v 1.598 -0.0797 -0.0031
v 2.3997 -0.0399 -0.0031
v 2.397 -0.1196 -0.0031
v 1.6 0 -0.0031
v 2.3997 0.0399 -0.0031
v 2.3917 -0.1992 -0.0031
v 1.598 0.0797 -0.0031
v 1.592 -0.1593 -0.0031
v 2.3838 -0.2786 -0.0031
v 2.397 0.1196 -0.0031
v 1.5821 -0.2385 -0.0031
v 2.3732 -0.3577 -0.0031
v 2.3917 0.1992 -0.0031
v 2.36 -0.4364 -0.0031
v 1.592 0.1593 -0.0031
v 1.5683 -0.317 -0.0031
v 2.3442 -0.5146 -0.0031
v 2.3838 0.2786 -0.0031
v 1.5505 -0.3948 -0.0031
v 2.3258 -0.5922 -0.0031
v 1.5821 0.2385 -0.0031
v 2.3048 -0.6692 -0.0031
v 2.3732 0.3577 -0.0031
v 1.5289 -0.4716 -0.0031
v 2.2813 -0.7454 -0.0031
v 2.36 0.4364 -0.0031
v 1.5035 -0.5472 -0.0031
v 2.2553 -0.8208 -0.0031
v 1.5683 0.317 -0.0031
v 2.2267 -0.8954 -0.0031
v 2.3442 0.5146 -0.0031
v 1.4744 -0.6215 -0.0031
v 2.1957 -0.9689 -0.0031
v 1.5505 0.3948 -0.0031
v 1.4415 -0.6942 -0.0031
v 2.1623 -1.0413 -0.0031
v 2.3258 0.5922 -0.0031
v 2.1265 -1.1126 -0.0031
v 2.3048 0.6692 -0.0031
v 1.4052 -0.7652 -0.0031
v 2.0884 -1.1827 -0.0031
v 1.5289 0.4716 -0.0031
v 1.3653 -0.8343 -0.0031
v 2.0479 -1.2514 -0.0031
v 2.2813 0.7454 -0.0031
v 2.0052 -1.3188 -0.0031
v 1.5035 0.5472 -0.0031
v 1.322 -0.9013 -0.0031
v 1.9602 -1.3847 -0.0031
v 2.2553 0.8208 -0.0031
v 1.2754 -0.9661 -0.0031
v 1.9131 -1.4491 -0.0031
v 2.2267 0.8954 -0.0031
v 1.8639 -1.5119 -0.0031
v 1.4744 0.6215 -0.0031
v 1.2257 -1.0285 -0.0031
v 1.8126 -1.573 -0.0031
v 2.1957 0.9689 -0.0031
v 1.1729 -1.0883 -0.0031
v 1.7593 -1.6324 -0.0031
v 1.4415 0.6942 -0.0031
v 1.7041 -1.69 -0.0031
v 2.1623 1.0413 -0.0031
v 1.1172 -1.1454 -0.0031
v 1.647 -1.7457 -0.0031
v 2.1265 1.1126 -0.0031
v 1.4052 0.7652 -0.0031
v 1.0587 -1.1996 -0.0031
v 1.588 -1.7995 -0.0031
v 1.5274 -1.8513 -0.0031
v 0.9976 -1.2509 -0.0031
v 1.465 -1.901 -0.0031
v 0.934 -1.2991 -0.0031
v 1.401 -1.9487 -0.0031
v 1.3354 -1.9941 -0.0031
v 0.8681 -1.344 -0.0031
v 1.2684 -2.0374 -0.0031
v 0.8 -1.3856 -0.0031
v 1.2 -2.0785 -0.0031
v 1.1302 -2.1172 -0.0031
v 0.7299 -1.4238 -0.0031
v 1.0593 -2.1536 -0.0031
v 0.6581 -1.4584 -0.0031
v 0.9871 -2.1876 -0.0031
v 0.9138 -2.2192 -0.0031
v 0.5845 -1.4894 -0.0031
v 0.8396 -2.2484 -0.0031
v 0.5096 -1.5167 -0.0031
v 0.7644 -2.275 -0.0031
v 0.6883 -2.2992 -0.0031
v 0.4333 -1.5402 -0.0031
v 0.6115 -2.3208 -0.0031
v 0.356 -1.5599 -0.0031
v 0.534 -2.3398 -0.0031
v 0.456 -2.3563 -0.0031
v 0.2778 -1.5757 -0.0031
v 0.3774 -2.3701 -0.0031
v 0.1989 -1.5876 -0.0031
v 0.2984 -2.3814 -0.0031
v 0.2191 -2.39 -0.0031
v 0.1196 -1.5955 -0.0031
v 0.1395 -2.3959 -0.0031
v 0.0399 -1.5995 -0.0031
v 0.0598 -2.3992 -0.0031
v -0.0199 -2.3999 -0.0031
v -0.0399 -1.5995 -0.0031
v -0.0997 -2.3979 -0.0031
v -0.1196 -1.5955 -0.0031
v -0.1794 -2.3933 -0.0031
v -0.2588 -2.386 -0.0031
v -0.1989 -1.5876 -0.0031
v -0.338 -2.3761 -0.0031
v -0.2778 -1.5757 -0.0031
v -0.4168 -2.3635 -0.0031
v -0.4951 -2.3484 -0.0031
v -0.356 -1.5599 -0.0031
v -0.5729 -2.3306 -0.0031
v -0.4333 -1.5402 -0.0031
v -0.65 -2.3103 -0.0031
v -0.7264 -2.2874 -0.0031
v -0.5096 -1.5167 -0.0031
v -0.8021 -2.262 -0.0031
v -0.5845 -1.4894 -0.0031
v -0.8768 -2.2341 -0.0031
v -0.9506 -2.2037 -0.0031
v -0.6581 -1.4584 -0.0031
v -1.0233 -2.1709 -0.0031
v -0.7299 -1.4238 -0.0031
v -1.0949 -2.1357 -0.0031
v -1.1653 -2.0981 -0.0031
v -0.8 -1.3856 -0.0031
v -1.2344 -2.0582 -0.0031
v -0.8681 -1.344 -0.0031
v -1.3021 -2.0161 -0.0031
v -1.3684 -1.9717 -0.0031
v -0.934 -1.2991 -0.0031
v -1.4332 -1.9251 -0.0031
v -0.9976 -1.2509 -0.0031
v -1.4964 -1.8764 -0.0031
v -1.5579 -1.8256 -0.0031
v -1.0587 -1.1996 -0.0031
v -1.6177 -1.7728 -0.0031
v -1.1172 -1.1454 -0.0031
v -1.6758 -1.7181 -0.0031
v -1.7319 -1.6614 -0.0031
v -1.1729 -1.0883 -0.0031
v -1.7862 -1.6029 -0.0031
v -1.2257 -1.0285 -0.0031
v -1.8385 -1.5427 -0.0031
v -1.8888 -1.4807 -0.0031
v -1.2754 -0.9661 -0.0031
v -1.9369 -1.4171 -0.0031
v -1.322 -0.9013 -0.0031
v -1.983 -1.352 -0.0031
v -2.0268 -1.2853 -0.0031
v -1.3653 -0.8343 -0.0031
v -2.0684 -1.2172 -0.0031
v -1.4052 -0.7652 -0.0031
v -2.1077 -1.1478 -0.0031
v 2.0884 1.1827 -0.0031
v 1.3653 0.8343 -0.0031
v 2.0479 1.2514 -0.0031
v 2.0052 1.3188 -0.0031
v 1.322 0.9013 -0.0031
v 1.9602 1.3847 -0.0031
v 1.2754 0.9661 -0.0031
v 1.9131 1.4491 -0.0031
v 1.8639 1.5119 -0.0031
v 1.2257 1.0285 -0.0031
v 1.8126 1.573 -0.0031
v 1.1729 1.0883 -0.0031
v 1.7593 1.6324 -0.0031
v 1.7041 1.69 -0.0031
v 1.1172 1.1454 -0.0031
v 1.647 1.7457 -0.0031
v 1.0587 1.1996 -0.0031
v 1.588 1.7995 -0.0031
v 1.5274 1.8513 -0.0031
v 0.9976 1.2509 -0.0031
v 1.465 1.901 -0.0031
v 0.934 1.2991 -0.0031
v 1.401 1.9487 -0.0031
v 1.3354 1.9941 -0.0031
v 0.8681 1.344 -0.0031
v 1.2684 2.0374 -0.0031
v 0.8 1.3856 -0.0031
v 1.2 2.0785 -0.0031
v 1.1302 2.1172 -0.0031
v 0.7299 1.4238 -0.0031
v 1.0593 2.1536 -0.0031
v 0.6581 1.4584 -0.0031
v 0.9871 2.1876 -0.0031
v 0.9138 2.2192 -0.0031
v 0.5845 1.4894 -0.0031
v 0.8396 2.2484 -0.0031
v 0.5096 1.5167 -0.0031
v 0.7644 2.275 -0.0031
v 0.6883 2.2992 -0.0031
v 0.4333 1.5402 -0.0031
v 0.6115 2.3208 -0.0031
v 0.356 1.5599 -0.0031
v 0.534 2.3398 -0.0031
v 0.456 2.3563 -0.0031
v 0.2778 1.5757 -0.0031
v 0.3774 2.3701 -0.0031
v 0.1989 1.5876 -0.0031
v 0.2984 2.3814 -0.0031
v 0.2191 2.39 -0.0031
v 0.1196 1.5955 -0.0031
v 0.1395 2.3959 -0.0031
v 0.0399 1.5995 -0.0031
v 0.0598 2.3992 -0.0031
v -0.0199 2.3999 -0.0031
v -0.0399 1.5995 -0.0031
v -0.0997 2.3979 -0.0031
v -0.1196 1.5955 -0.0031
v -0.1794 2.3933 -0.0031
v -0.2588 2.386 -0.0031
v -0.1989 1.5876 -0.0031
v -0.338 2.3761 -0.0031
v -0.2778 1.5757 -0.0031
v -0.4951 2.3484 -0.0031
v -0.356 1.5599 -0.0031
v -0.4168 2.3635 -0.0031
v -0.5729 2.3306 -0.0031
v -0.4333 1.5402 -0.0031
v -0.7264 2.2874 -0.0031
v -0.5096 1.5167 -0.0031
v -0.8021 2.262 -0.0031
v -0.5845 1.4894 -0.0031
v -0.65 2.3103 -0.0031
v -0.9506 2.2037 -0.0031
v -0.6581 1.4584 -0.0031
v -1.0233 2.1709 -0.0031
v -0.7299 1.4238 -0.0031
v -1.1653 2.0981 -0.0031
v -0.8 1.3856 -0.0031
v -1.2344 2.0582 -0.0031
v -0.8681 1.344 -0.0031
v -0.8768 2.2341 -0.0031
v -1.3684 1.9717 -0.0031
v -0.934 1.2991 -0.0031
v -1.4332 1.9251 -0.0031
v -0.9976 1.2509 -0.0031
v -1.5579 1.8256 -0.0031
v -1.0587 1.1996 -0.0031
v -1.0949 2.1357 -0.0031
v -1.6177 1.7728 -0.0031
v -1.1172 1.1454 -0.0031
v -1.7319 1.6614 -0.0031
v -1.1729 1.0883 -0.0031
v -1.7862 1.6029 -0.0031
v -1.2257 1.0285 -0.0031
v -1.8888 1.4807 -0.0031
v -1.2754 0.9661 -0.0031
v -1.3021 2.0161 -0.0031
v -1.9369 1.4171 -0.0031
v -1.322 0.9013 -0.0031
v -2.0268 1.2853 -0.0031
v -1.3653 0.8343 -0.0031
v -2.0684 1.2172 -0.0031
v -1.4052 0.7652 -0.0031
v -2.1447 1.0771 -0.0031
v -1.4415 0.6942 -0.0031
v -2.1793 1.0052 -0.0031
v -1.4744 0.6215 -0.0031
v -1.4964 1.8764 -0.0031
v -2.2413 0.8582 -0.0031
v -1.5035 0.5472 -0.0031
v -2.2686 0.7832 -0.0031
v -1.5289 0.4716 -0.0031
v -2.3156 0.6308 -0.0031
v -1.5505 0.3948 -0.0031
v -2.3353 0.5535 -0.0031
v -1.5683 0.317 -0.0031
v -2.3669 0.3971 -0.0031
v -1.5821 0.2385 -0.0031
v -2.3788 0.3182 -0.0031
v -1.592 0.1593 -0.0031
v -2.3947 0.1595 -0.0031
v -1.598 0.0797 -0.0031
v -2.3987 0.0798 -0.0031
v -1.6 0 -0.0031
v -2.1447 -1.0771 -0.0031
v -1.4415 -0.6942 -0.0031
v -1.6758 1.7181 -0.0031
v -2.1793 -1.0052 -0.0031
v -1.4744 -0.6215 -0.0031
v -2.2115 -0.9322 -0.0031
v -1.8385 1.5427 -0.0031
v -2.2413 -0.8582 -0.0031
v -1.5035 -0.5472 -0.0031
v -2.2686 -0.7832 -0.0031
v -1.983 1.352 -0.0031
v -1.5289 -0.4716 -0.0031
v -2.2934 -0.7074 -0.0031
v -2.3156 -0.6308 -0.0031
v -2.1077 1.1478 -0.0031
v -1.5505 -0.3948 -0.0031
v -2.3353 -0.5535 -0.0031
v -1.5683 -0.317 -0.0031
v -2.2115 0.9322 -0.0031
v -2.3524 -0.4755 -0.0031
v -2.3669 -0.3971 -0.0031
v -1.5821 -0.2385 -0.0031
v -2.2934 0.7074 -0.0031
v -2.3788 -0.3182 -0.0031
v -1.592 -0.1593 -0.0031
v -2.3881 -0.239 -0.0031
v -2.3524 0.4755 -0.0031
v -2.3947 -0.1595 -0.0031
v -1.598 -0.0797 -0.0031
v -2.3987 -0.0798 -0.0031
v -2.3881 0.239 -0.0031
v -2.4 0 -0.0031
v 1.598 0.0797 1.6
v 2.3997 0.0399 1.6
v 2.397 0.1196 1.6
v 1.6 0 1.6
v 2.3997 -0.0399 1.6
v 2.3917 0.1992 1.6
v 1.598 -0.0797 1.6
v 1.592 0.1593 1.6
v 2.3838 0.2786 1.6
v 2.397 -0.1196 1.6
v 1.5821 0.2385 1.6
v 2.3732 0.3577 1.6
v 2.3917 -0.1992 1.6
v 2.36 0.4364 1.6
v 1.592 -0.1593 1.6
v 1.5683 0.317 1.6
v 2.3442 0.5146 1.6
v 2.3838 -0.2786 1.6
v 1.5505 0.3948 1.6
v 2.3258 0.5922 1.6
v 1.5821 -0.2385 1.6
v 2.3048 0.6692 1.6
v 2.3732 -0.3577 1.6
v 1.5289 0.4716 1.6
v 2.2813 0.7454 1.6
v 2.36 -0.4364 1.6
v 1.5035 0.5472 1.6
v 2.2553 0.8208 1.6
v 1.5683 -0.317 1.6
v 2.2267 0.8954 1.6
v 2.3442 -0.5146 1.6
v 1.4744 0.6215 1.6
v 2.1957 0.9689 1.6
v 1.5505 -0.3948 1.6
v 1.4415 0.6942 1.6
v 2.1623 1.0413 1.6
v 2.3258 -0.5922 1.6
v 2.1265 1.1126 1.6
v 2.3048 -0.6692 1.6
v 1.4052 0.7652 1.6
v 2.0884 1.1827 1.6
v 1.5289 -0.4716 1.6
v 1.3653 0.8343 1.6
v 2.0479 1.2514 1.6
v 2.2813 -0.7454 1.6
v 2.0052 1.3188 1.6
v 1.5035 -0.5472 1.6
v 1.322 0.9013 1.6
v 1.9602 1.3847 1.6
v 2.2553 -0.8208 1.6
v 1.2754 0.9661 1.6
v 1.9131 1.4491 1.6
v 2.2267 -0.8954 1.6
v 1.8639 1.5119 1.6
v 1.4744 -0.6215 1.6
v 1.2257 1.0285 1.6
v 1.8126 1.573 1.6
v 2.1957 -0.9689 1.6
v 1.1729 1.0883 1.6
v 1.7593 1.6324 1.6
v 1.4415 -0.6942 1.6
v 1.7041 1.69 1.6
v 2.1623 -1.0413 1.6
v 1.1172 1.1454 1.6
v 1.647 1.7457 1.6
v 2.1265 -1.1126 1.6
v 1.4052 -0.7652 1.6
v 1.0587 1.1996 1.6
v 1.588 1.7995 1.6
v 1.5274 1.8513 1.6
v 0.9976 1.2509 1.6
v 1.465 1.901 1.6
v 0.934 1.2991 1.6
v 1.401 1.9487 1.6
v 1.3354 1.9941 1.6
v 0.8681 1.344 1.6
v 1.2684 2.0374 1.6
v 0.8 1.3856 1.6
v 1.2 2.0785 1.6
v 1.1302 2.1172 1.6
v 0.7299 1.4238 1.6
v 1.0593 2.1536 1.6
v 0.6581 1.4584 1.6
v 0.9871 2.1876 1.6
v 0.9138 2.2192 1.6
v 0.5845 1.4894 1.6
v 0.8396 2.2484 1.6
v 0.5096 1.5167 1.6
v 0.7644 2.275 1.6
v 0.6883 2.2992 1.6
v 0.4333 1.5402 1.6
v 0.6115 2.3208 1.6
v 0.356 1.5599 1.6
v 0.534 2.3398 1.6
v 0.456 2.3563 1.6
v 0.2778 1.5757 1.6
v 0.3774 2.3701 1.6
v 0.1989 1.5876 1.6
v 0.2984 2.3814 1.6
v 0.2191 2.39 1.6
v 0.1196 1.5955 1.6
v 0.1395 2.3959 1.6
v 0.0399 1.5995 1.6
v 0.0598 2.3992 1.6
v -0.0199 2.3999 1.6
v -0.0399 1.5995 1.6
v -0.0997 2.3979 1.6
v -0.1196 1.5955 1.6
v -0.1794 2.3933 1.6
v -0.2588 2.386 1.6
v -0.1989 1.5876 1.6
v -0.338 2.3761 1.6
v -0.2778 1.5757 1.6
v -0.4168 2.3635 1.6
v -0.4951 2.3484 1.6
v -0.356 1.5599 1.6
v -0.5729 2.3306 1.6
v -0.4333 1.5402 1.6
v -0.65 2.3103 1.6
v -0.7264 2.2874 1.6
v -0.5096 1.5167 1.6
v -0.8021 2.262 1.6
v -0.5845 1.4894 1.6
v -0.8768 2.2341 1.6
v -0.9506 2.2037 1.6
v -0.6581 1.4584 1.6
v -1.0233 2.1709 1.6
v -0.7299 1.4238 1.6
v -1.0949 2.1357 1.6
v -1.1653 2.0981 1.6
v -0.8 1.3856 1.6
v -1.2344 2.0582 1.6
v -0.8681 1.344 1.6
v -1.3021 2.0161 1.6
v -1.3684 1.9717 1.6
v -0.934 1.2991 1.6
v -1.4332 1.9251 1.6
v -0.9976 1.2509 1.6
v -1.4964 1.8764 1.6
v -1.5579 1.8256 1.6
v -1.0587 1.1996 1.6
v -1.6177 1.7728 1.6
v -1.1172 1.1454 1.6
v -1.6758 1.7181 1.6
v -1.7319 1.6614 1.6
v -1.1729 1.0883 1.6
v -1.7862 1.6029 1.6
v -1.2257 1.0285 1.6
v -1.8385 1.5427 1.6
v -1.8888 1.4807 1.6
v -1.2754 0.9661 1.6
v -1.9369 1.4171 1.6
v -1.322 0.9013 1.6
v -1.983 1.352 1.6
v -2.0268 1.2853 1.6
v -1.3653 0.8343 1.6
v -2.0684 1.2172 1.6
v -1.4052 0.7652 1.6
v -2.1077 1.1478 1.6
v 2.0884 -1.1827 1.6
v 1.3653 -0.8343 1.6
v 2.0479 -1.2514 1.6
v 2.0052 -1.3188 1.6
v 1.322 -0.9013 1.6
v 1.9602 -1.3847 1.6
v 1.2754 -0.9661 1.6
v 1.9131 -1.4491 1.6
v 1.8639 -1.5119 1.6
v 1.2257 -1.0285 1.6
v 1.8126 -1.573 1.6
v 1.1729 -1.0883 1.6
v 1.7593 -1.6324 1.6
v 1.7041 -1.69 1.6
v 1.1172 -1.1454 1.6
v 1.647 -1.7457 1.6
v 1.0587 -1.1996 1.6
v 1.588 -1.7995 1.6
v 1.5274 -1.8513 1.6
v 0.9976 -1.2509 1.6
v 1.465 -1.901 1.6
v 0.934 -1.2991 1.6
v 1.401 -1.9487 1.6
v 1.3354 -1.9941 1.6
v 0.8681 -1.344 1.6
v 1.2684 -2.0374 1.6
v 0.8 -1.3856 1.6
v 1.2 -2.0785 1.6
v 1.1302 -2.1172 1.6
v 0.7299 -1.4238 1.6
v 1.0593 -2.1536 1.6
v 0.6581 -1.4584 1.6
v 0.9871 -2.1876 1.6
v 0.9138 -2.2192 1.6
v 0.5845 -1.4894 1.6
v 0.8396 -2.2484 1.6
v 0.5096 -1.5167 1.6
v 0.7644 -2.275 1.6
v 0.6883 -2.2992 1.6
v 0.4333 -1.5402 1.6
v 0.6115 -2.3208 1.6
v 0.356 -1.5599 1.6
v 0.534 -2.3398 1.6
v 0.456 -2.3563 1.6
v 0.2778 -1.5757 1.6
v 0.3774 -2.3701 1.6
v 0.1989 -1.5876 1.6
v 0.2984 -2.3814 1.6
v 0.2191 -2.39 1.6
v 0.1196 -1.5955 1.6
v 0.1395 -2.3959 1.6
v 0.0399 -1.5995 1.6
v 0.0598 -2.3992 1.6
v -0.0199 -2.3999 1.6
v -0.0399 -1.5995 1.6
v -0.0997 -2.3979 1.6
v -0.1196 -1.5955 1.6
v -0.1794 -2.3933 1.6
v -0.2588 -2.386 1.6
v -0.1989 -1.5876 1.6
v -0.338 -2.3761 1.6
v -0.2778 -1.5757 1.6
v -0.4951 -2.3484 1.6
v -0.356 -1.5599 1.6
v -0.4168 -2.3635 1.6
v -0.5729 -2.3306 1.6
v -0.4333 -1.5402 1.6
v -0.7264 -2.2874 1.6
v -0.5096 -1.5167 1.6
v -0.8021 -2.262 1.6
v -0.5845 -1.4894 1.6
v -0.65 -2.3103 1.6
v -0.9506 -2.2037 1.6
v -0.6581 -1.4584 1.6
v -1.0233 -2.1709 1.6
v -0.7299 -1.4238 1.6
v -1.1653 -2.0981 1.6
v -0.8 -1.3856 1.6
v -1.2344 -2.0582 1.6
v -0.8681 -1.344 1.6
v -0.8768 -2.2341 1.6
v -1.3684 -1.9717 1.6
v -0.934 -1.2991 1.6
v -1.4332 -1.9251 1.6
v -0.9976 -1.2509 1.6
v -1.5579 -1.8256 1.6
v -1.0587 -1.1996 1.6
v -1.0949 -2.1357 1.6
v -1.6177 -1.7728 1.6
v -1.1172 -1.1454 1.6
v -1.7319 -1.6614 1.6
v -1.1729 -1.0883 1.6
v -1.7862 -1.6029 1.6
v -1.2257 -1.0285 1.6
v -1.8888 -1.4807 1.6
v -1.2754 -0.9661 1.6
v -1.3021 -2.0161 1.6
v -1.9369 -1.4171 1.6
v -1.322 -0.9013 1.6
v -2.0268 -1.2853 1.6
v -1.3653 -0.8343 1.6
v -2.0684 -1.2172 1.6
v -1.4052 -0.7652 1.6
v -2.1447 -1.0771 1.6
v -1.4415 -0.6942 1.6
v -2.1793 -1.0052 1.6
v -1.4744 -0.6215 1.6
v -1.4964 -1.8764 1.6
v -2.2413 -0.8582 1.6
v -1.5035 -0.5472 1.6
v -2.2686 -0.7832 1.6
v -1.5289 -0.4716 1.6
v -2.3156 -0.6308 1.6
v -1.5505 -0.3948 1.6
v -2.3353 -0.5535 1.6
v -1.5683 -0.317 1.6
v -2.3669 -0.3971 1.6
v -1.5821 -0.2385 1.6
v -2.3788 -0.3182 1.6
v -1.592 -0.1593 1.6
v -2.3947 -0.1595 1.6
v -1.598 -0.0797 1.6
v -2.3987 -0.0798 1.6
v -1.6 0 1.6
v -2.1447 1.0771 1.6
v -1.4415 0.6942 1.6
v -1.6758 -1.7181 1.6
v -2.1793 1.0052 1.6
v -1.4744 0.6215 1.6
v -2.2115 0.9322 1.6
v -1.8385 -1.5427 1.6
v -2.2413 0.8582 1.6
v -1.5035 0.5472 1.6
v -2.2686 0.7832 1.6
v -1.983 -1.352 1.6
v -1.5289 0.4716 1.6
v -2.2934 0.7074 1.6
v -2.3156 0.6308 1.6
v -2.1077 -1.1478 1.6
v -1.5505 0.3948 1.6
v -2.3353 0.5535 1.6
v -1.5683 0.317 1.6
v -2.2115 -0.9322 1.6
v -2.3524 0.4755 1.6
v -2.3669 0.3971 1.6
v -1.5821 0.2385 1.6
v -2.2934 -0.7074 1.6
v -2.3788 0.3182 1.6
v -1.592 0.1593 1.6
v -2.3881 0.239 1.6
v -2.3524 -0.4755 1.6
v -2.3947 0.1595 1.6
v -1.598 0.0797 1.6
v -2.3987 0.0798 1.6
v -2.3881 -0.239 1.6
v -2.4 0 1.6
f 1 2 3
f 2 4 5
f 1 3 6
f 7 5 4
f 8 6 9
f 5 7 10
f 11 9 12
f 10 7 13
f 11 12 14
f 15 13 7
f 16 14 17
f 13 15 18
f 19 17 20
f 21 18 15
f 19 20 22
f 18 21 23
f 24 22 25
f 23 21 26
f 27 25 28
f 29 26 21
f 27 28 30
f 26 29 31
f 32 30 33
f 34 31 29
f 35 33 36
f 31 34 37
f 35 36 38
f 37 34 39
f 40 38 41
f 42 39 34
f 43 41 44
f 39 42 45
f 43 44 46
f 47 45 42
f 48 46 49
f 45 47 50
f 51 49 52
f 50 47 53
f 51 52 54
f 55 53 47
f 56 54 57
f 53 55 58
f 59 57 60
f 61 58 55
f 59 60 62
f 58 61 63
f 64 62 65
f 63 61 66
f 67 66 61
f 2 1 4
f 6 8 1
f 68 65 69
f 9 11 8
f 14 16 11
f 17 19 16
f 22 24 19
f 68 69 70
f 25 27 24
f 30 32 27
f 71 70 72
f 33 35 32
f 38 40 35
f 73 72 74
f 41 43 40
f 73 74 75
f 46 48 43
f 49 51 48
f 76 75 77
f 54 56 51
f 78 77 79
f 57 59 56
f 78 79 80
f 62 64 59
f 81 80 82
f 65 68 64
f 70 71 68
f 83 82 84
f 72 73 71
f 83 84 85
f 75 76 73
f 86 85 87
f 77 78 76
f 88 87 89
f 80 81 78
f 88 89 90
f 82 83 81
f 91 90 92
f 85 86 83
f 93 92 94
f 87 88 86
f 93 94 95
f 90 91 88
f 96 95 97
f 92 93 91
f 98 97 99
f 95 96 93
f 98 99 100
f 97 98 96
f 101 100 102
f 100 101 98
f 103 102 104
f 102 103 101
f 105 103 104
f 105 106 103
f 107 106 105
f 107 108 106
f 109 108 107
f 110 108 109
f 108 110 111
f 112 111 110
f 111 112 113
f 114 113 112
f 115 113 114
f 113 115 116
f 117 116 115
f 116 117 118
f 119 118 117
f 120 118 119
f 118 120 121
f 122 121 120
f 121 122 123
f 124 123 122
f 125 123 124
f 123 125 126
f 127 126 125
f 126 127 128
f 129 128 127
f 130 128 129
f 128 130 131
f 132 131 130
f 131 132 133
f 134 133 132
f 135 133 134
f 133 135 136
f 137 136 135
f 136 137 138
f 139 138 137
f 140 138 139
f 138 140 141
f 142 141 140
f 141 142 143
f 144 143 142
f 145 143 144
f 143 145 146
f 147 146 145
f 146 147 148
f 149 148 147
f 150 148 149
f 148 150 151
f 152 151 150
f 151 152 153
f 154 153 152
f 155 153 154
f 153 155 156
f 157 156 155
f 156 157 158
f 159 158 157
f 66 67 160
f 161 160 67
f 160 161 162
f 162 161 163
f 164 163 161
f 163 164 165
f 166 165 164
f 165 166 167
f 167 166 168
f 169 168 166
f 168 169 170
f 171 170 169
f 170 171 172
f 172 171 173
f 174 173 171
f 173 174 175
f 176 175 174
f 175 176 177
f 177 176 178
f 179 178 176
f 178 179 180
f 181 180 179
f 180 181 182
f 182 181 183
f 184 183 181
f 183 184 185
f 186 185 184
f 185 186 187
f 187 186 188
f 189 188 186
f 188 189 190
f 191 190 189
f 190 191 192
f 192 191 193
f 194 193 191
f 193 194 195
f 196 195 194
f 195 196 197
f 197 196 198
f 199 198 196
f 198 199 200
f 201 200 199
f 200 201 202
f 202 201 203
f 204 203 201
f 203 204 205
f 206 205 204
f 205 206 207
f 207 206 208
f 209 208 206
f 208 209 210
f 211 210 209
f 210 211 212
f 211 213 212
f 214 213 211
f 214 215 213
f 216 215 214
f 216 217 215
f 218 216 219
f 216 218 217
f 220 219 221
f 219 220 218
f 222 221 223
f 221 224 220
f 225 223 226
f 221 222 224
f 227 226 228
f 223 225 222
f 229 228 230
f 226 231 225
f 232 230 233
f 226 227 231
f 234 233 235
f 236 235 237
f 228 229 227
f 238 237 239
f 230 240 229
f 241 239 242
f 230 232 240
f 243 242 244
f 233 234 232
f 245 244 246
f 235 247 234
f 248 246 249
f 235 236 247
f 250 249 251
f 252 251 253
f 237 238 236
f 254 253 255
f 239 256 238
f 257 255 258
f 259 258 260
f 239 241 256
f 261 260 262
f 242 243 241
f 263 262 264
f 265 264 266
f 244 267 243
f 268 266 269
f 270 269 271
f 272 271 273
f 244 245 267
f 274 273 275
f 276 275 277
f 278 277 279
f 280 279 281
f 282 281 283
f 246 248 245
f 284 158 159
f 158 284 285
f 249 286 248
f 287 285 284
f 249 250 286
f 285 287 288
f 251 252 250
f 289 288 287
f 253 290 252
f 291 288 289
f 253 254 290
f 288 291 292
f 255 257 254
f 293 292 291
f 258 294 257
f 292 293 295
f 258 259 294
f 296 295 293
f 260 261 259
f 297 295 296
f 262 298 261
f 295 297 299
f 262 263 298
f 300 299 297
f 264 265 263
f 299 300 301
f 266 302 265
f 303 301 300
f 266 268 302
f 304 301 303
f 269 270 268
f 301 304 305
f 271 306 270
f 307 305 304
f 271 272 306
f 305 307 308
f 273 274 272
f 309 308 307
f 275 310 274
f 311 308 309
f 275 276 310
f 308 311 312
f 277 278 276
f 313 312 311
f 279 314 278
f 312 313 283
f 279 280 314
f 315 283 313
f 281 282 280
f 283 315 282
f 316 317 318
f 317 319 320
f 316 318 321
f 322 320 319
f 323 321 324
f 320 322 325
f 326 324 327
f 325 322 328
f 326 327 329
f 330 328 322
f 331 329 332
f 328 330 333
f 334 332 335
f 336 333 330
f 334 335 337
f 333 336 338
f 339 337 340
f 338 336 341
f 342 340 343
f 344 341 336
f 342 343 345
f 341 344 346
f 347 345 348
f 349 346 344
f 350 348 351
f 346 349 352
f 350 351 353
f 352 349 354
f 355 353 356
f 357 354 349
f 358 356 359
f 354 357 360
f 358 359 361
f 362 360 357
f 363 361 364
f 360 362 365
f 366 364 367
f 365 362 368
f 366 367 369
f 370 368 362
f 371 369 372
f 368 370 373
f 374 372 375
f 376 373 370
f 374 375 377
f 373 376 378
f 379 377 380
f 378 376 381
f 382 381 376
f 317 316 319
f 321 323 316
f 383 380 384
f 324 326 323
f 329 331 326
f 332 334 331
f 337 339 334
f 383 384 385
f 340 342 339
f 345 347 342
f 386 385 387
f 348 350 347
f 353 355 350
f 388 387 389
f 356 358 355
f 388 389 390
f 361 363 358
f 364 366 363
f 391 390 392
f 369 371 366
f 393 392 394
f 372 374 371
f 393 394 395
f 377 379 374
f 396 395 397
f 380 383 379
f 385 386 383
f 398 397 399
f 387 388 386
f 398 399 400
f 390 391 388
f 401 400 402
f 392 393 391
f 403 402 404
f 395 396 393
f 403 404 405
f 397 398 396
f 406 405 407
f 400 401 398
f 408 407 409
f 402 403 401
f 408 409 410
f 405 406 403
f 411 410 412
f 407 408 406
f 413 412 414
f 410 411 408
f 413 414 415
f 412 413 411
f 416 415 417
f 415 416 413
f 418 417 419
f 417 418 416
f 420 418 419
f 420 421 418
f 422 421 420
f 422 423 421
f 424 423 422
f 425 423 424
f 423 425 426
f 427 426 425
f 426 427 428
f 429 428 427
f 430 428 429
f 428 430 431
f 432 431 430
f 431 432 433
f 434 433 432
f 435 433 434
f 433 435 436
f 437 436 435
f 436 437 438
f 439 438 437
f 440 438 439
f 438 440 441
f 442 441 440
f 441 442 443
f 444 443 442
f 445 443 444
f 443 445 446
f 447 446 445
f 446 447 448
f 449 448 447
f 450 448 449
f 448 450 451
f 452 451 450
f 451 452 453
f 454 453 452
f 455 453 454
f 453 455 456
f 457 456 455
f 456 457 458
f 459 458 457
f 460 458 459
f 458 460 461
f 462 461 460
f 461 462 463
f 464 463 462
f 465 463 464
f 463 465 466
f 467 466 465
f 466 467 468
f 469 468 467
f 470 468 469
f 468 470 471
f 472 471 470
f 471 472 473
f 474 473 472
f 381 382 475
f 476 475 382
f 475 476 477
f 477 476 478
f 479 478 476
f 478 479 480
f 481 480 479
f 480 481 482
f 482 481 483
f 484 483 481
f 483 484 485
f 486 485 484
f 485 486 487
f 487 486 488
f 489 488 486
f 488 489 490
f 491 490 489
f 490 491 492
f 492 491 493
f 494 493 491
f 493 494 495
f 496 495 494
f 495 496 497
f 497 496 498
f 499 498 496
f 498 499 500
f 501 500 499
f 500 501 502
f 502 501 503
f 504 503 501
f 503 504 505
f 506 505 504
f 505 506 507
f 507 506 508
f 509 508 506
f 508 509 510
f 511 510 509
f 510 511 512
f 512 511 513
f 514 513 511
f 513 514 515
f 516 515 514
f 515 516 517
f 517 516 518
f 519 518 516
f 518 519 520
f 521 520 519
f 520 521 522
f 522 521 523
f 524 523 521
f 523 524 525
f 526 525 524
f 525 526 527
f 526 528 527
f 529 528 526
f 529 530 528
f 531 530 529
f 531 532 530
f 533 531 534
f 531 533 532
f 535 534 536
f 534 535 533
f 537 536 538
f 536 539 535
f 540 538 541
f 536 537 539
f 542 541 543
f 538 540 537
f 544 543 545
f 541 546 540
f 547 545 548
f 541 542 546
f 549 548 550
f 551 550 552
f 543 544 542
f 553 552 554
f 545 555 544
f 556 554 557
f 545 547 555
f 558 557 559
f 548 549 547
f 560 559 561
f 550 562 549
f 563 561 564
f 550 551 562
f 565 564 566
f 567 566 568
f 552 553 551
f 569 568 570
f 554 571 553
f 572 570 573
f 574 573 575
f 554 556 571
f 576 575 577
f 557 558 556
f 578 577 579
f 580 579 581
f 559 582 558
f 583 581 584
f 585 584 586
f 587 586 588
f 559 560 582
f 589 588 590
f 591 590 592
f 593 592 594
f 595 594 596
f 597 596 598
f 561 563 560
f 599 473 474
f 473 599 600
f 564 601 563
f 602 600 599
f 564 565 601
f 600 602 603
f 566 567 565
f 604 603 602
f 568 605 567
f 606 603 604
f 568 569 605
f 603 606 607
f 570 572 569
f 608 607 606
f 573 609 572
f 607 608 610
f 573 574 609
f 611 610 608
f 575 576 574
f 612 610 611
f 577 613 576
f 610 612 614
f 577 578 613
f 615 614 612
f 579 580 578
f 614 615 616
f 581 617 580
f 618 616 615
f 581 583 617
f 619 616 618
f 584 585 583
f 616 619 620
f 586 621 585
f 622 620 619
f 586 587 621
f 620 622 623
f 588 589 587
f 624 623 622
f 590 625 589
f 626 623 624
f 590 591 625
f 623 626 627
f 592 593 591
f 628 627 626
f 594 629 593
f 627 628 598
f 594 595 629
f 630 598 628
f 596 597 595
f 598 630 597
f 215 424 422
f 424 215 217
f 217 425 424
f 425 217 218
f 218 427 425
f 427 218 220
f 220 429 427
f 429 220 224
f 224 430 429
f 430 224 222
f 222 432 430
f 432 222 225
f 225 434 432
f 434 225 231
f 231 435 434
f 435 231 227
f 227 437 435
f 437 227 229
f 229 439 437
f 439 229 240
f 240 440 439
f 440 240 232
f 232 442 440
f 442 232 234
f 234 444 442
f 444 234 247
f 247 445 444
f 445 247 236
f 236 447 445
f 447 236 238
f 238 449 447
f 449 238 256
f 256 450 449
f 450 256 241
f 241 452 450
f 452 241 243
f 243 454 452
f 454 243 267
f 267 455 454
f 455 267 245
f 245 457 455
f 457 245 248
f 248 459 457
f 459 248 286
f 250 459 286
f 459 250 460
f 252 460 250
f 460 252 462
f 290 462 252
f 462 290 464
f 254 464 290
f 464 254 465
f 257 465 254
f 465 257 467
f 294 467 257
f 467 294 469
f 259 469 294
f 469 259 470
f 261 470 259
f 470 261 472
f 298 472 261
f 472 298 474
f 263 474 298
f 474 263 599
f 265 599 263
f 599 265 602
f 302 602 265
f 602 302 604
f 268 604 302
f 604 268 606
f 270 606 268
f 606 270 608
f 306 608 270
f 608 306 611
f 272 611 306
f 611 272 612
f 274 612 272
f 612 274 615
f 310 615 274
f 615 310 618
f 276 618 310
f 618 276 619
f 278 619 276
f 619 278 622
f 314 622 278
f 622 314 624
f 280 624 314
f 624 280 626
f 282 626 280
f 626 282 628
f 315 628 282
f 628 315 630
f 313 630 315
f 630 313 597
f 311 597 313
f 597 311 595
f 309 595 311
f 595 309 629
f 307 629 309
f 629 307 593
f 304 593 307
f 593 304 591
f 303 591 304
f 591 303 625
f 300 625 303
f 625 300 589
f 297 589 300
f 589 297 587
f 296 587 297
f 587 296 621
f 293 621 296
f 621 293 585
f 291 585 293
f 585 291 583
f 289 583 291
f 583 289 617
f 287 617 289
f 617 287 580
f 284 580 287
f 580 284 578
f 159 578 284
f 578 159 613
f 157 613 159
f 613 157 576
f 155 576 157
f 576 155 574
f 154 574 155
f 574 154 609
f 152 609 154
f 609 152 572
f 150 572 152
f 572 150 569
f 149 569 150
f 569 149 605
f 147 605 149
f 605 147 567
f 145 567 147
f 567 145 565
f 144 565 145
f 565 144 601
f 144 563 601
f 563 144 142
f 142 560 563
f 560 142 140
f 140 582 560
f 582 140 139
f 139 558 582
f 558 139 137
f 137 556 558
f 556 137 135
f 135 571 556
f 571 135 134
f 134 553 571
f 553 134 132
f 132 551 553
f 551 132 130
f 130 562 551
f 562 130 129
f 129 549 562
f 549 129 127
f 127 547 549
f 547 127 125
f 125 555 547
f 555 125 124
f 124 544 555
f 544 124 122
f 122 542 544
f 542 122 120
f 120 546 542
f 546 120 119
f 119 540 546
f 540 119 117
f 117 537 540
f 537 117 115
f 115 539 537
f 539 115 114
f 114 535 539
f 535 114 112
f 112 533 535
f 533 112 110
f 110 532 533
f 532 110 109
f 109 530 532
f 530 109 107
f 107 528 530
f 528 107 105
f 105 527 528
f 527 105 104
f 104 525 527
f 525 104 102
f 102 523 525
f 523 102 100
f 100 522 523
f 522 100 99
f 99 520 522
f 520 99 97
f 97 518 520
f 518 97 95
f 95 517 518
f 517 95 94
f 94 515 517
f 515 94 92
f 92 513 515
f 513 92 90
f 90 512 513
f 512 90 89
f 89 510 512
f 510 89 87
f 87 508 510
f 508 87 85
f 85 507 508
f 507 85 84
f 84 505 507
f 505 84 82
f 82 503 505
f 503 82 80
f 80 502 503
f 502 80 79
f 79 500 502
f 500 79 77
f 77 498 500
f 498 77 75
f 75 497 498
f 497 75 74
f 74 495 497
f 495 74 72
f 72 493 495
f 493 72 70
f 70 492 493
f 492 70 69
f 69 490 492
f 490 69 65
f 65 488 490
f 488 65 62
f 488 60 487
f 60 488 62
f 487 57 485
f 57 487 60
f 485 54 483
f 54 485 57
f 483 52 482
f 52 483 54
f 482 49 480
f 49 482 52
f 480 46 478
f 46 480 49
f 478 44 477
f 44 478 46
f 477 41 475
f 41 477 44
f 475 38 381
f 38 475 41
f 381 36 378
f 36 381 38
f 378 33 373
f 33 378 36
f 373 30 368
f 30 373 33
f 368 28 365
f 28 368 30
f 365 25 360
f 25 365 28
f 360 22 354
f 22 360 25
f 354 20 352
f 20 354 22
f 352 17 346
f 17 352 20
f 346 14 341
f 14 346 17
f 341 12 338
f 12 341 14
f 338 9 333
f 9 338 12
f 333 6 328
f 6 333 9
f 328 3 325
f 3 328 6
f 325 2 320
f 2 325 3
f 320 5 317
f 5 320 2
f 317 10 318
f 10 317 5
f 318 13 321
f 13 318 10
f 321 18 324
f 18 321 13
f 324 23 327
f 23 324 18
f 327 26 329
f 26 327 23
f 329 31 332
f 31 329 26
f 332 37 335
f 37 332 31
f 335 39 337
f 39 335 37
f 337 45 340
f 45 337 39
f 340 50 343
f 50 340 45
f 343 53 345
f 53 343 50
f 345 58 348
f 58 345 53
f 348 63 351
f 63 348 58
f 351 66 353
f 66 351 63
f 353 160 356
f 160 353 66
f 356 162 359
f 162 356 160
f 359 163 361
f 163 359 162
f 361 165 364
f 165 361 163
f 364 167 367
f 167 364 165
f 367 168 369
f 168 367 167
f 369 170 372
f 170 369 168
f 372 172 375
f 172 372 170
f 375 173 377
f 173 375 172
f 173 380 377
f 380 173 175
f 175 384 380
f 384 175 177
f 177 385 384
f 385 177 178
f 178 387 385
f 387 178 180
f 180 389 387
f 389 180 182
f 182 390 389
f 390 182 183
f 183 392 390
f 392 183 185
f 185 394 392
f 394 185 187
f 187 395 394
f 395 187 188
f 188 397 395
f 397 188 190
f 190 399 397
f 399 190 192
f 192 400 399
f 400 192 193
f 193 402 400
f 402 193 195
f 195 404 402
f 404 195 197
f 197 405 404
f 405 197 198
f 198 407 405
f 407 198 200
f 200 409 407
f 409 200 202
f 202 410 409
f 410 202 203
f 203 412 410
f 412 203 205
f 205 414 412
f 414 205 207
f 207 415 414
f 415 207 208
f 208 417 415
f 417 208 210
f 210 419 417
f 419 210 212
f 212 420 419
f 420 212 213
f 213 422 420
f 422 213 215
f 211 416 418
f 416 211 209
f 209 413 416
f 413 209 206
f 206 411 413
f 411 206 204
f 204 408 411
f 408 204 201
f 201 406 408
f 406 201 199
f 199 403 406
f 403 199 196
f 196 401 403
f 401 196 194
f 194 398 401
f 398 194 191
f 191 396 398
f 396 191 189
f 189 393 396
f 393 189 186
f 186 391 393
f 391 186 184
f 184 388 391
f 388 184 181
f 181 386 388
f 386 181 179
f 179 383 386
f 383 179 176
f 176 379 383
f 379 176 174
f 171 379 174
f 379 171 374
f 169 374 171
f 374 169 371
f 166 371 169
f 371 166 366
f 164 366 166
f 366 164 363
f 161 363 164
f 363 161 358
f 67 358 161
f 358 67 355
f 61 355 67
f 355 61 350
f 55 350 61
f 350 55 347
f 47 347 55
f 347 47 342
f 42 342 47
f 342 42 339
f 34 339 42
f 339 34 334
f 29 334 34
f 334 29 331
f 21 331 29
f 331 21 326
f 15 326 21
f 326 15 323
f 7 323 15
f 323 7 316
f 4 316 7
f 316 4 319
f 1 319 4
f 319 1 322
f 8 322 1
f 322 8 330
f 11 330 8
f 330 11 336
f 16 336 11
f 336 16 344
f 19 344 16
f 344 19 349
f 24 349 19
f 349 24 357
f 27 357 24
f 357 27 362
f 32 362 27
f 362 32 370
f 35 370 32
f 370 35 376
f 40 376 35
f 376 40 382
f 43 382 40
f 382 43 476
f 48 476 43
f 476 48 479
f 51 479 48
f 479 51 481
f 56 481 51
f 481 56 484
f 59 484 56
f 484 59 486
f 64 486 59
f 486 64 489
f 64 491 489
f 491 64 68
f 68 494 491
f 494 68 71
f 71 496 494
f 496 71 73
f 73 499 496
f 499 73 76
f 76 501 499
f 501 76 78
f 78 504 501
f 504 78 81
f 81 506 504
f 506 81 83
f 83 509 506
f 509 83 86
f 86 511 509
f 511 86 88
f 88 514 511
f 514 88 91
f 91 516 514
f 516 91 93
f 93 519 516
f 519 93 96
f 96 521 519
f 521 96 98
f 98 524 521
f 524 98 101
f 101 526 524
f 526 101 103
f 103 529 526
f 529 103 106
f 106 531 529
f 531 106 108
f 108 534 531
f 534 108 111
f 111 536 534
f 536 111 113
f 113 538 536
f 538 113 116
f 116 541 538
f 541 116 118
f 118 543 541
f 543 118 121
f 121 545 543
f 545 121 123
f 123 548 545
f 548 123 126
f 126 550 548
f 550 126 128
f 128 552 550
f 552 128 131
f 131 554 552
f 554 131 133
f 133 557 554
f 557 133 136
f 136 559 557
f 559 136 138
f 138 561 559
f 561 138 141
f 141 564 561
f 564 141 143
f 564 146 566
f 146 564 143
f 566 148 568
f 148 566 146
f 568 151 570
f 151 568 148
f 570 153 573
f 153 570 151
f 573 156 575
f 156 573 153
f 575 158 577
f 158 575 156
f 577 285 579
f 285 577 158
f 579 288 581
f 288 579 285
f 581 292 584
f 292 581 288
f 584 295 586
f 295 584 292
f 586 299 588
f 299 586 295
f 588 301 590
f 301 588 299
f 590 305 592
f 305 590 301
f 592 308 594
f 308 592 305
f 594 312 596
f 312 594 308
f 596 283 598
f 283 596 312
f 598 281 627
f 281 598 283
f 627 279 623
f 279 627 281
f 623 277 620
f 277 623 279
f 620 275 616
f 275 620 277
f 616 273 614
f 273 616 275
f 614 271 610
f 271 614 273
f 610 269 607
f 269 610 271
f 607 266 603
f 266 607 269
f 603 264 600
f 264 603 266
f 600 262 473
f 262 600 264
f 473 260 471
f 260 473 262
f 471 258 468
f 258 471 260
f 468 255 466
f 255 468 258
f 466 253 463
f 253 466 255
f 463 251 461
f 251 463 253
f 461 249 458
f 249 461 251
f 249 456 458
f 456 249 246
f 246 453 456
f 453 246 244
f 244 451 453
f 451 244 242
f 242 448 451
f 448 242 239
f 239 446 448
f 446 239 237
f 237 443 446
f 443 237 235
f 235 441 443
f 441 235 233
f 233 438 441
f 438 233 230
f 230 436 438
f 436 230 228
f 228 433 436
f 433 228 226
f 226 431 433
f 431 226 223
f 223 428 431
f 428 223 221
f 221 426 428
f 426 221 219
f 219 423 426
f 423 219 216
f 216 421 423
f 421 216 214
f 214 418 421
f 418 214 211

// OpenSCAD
use <../lib.scad>
use <s/3626cs02.scad>
use <s/3626p88s01.scad>
$fa=1; $fs=0.2;
function ldraw_lib__3626cp88(realsolid=false) = [
// 0 Minifig Head with Grin, Brown Beard, White Pupils Pattern (Hollow Stud)
// 0 Name: 3626cp88.dat
// 0 Author: Howard Lande [HowardLande]
// 0 !LDRAW_ORG Part UPDATE 2022-06
// 0 !LICENSE Licensed under CC BY 2.0 and CC BY 4.0 : see CAreadme.txt
// 
// 0 BFC CERTIFY CCW
  [0,"BFC","CERTIFY"],
  [0,"BFC","CCW"],
// 
// 0 !KEYWORDS Bricklink 3626cpb0332, set 10222, set 7939
// 
// 0 !HISTORY 2016-12-31 [PTadmin] Official Update 2016-01
// 0 !HISTORY 2022-07-11 [MagFors] Update description, added keywords
// 0 !HISTORY 2022-07-18 [PTadmin] Official Update 2022-04
// 0 !HISTORY 2022-11-06 [OrionP] Update description
// 0 !HISTORY 2022-12-20 [PTadmin] Official Update 2022-06
// 
// 
// 1 16 0 0 0 1 0 0 0 1 0 0 0 1 s\3626cs02.dat
  [1,16,0,0,0,1,0,0,0,1,0,0,0,1, ldraw_lib__s__3626cs02(realsolid)],
// 1 16 0 0 0 1 0 0 0 1 0 0 0 1 s\3626p88s01.dat
  [1,16,0,0,0,1,0,0,0,1,0,0,0,1, ldraw_lib__s__3626p88s01(realsolid)],
];
module ldraw_lib__3626cp88(step=0, col=false, unit=2/5, alt=false, line=0.2, solid=!$preview)
    makepoly(ldraw_lib__3626cp88(solid), step=step, col=col, unit=unit, alt=alt, line=line, solid=solid);
ldraw_lib__3626cp88(line=0.2);
